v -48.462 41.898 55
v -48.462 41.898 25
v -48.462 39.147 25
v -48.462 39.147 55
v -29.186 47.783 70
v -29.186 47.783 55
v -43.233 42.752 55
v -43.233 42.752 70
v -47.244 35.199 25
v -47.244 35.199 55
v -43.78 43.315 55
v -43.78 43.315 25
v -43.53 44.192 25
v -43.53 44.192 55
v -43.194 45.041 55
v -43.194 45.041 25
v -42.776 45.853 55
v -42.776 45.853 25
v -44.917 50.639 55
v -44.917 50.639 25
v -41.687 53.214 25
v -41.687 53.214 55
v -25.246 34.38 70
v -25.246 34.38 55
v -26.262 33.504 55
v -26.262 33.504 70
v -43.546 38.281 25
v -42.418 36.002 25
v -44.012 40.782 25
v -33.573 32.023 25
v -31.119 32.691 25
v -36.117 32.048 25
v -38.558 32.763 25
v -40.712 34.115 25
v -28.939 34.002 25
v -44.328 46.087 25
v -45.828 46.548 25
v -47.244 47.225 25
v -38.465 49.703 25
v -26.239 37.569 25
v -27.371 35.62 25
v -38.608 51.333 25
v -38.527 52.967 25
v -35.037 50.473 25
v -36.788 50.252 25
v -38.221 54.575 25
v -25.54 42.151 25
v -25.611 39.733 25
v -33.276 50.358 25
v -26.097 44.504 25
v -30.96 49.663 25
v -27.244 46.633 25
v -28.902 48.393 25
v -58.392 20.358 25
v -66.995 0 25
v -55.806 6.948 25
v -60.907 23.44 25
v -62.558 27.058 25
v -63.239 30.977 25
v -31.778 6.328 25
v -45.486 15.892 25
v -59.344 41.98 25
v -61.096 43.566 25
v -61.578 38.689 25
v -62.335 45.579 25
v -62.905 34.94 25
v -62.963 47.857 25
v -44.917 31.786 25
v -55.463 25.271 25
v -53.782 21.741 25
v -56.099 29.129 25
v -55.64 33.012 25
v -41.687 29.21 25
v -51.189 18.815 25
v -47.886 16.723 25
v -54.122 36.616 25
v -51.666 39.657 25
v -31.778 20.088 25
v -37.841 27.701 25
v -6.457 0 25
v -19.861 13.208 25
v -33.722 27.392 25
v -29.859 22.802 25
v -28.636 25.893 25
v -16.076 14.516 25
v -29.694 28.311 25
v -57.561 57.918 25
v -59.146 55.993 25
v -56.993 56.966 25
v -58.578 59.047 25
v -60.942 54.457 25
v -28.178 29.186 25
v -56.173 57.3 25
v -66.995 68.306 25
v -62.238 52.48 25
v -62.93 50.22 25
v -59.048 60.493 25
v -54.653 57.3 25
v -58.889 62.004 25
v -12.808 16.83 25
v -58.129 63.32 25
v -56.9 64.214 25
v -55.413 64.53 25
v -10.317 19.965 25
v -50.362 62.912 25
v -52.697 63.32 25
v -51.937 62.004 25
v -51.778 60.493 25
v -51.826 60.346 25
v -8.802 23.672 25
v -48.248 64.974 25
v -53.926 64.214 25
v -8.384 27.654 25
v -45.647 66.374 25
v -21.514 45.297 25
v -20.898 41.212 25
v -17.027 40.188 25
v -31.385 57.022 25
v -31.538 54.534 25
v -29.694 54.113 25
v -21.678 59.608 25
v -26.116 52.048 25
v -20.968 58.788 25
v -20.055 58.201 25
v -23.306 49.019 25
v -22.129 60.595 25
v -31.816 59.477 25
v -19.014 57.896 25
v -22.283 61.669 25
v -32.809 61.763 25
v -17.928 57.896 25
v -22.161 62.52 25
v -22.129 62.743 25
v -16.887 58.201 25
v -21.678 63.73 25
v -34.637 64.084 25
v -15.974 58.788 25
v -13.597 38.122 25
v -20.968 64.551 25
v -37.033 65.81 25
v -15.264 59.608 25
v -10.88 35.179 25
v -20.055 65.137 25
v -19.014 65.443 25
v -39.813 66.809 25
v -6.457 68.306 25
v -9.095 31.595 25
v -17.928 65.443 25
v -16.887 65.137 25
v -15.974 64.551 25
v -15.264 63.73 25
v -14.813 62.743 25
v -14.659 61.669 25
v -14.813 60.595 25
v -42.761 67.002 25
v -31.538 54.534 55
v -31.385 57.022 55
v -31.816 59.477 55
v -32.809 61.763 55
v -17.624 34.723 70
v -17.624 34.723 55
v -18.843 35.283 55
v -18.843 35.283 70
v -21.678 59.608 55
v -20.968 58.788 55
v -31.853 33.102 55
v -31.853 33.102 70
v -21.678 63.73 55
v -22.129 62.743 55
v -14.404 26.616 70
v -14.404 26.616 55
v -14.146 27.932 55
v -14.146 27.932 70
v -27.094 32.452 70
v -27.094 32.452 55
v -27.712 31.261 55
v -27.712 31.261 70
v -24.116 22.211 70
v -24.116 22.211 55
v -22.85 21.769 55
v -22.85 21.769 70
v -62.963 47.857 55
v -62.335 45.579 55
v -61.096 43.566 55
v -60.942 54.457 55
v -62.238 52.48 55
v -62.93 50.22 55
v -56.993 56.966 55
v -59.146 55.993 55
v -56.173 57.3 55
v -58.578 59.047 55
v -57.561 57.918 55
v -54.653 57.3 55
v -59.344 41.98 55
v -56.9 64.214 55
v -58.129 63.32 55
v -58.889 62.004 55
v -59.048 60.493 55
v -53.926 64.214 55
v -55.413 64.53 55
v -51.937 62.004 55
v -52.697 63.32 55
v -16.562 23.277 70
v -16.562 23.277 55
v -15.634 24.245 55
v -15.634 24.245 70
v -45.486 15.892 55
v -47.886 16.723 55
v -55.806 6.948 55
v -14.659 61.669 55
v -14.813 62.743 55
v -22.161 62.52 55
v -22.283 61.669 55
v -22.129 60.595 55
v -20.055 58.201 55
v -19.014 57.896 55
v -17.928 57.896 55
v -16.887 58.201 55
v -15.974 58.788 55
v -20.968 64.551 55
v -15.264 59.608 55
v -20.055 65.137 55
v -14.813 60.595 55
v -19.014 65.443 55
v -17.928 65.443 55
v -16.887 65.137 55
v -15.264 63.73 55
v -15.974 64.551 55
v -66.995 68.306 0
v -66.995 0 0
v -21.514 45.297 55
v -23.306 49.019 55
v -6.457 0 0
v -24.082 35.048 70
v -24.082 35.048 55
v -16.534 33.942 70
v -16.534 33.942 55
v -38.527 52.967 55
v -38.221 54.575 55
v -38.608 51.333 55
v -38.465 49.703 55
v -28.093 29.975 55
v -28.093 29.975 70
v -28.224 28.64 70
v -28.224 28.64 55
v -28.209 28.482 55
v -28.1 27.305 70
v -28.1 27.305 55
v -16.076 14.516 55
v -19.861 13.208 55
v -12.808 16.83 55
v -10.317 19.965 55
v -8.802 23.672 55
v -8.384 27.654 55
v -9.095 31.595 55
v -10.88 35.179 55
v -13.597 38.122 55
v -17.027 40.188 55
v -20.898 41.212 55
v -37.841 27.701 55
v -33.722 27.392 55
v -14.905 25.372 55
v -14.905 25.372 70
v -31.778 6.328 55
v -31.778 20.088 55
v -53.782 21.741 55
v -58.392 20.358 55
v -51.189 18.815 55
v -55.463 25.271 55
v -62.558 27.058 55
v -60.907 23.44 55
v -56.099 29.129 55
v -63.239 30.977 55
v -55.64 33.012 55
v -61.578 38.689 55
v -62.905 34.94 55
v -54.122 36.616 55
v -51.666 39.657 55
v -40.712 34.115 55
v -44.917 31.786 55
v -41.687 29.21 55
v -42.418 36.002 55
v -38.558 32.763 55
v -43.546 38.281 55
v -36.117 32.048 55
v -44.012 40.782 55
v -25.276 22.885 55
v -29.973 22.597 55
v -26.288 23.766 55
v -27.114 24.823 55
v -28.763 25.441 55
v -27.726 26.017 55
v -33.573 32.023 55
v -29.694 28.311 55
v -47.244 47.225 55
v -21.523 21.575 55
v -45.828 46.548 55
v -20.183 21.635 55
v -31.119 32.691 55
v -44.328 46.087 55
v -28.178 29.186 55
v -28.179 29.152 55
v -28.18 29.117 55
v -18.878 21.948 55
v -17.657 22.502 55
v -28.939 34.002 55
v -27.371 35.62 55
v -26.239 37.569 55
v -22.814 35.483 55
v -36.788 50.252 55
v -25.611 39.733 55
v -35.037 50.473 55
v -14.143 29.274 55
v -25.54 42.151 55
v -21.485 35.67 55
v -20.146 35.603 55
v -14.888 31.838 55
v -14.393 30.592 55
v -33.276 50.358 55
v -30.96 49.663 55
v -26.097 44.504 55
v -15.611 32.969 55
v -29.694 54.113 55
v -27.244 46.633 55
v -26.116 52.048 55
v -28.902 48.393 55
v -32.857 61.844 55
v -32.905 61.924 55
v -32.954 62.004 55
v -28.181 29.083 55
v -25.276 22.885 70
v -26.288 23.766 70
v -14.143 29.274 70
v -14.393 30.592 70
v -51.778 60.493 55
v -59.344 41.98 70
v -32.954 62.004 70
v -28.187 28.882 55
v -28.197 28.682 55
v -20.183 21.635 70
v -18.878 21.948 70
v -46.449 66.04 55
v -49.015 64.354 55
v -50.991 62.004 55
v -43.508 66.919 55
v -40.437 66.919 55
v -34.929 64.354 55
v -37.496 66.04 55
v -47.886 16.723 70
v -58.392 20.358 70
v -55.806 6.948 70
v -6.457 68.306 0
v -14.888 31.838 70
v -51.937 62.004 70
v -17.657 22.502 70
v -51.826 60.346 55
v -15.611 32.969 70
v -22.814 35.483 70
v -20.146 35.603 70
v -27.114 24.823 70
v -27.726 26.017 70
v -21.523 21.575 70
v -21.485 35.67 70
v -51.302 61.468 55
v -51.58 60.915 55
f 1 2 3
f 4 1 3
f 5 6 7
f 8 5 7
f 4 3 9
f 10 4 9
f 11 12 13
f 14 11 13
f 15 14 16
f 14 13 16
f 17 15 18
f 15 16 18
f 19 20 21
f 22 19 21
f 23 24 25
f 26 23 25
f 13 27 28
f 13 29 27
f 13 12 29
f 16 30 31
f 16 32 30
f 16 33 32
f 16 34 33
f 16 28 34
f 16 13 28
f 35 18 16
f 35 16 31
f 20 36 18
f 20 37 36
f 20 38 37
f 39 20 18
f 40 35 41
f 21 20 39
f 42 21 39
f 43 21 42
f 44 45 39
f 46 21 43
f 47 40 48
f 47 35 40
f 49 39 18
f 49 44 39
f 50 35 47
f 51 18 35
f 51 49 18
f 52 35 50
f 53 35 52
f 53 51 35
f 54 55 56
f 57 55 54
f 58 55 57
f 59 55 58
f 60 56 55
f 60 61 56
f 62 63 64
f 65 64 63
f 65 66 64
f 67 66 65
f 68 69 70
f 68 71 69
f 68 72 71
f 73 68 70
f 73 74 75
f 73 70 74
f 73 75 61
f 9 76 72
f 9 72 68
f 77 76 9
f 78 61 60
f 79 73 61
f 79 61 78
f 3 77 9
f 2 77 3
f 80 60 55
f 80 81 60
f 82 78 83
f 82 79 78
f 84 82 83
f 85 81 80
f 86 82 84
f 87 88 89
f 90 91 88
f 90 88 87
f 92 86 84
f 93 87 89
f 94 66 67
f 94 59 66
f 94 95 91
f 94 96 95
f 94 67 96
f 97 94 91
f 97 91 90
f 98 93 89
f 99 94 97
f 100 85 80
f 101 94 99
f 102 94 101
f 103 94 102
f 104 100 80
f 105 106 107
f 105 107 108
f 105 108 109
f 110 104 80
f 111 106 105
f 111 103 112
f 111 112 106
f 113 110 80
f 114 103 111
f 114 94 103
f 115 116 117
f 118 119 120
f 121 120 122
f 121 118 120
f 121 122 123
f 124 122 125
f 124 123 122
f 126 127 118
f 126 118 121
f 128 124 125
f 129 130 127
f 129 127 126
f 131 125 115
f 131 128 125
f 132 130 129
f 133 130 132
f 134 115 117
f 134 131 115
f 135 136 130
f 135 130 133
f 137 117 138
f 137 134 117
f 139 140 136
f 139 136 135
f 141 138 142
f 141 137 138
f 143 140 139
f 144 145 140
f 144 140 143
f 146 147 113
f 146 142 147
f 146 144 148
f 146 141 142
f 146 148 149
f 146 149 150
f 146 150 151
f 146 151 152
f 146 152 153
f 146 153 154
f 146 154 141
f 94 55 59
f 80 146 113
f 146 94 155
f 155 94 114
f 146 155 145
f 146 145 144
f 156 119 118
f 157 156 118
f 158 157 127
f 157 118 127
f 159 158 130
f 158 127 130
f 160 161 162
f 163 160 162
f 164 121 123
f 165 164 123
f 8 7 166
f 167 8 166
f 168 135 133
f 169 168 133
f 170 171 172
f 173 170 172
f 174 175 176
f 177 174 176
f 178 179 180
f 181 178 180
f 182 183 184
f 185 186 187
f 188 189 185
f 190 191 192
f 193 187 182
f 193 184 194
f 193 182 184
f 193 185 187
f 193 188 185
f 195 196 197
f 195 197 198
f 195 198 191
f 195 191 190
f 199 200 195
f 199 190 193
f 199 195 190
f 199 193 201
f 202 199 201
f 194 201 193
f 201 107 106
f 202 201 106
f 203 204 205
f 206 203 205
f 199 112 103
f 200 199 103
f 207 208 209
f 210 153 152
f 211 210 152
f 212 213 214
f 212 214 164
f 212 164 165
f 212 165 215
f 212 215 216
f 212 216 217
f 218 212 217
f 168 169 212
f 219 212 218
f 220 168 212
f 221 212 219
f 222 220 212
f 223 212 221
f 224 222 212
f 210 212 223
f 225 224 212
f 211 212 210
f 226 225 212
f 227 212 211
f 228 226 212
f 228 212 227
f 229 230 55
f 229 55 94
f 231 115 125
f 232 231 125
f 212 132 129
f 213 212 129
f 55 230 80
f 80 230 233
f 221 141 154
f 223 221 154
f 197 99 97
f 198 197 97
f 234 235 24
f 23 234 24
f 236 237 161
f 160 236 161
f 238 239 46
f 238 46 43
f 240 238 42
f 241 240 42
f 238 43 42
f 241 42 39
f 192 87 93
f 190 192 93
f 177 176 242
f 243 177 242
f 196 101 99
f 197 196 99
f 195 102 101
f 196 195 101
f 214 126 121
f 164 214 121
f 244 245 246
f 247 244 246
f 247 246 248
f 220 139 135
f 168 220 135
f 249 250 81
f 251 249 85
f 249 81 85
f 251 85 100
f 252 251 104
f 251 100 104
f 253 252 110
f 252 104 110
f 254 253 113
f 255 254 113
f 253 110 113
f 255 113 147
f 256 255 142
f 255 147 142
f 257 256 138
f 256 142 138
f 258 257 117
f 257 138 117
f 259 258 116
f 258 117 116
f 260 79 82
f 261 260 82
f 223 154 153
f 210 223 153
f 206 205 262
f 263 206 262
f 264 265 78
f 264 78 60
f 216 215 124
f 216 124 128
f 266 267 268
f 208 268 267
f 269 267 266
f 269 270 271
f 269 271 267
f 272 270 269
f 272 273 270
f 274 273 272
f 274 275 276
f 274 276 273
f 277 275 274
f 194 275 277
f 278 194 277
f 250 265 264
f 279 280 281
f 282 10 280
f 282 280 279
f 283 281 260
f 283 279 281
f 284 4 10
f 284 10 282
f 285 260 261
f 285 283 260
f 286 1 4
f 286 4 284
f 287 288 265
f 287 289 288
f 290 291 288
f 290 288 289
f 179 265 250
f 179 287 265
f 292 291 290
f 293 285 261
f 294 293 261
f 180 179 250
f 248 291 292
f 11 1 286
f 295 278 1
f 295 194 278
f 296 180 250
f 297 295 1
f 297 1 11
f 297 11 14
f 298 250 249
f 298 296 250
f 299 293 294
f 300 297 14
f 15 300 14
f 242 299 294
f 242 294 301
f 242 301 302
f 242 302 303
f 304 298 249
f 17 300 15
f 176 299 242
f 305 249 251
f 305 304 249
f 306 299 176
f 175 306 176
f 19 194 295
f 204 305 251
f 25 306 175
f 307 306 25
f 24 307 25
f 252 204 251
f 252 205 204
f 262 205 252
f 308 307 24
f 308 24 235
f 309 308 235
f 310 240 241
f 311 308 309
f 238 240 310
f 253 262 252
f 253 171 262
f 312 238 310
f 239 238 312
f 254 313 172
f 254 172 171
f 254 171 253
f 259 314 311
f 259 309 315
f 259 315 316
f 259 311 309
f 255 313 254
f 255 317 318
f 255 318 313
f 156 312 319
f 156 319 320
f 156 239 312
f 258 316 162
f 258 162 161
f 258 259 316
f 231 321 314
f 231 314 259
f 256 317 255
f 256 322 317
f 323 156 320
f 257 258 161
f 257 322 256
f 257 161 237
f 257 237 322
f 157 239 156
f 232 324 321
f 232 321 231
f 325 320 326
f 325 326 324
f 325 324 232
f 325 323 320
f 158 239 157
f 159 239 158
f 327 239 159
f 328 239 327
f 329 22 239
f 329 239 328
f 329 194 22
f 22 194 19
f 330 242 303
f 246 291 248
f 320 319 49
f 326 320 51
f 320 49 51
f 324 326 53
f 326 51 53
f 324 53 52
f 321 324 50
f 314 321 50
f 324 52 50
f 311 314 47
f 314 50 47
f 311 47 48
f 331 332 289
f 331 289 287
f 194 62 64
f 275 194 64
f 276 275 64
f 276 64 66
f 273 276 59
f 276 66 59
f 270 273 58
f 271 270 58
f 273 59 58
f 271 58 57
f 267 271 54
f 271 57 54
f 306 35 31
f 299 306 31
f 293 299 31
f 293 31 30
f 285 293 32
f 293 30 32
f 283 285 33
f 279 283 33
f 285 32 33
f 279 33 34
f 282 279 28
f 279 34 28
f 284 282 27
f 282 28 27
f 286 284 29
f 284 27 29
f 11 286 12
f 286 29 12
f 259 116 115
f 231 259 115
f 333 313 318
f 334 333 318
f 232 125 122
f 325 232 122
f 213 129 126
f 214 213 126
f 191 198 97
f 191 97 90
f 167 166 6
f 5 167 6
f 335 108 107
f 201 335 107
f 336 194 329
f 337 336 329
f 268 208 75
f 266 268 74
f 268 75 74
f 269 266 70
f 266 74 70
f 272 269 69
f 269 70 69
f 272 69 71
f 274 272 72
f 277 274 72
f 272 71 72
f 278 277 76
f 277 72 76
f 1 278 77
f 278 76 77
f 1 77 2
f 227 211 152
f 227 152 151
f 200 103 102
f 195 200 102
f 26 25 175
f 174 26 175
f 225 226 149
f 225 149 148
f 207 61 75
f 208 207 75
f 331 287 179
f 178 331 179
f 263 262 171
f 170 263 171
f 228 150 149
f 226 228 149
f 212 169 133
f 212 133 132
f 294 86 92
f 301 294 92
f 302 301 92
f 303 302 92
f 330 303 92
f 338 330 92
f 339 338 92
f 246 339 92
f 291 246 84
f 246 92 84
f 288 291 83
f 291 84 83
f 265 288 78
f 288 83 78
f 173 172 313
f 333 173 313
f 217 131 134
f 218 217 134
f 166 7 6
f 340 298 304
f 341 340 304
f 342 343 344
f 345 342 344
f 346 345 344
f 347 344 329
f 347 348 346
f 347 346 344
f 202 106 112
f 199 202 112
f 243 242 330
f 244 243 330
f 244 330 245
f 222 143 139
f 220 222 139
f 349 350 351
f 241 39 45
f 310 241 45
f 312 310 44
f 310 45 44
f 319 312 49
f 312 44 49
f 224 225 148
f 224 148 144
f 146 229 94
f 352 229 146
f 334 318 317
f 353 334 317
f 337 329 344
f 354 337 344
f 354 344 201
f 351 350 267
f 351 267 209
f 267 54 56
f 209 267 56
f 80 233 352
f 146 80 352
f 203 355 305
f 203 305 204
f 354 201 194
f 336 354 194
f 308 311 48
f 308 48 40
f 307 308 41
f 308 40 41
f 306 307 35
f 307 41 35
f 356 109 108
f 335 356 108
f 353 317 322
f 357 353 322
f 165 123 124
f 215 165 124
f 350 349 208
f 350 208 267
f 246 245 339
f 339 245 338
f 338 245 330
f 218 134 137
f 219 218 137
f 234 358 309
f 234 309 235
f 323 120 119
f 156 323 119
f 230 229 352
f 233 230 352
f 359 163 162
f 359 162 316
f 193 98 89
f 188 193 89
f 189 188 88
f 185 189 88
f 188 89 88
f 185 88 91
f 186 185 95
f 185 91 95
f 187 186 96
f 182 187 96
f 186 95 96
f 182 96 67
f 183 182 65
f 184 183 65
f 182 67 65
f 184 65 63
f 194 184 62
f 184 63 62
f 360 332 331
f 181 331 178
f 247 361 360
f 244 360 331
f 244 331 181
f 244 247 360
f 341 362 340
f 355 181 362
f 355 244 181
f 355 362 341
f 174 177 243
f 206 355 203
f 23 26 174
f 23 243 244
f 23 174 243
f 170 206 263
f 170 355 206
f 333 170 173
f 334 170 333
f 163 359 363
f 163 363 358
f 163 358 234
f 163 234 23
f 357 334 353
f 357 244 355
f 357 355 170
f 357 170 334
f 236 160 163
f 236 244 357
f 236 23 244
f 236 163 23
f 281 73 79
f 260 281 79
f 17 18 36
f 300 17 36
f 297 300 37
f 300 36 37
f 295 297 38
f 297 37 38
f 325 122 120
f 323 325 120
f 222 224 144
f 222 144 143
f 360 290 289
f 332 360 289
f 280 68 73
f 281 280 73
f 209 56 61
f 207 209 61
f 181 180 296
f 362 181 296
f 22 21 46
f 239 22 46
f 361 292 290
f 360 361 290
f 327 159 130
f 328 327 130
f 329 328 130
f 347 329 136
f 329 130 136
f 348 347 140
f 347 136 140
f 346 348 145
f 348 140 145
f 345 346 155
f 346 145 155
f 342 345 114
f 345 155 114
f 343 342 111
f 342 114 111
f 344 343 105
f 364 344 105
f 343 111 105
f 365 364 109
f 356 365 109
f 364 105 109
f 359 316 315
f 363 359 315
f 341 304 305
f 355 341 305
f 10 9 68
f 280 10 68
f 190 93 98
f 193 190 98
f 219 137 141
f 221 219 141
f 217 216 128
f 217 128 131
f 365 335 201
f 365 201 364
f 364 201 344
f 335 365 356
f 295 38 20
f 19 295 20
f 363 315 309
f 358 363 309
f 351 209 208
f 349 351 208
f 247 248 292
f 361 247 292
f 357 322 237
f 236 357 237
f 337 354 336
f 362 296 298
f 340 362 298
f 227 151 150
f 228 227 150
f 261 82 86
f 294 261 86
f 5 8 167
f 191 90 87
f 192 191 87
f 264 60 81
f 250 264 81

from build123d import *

# Parameters (mm, degrees)
F0_W     = 60.5372022837
F0_H     = 68.3061406016
F1_DEPTH = 25
F3_DEPTH = 30
F5_DEPTH = 15


with BuildPart() as f1:
    # F0 (on Top) → F1 (new body)
    with BuildSketch(Plane.XY):
        with Locations((-36.7259019986, 34.1530703008)):
            Rectangle(F0_W, F0_H)
    extrude(amount=F1_DEPTH)

    # F2 (on face) → F3 (join)
    with BuildSketch(Plane.XY.offset(25)):
        with BuildLine():
            Line((-22.1290194054, 62.743389809), (-22.1611187409, 62.5201340268))
            ThreePointArc((-22.1611187409, 62.5201340268), (-19.2077082943, 60.7472143348), (-16.8872465406, 58.2013677664))
            Line((-16.8872465406, 58.2013677664), (-15.9743708465, 58.788037352))
            Line((-15.9743708465, 58.788037352), (-15.2637569545, 59.6081295006))
            Line((-15.2637569545, 59.6081295006), (-14.8129745762, 60.5952052236))
            Line((-14.8129745762, 60.5952052236), (-14.6585434187, 61.6692975163))
            Line((-14.6585434187, 61.6692975163), (-14.8129745762, 62.743389809))
            Line((-14.8129745762, 62.743389809), (-15.2637569545, 63.7304655321))
            Line((-15.2637569545, 63.7304655321), (-15.9743708465, 64.5505576807))
            Line((-15.9743708465, 64.5505576807), (-16.8872465406, 65.1372272663))
            Line((-16.8872465406, 65.1372272663), (-17.9284282773, 65.4429458082))
            Line((-17.9284282773, 65.4429458082), (-19.0135657043, 65.4429458082))
            Line((-19.0135657043, 65.4429458082), (-20.054747441, 65.1372272663))
            Line((-20.054747441, 65.1372272663), (-20.9676231351, 64.5505576807))
            Line((-20.9676231351, 64.5505576807), (-21.6782370271, 63.7304655321))
            Line((-21.6782370271, 63.7304655321), (-22.1290194054, 62.743389809))
        make_face()
        with BuildLine():
            ThreePointArc((-16.8872465406, 58.2013677664), (-19.2077082943, 60.7472143348), (-22.1611187409, 62.5201340268))
            Line((-22.1611187409, 62.5201340268), (-22.2834505629, 61.6692975163))
            Line((-22.2834505629, 61.6692975163), (-22.1290194054, 60.5952052236))
            Line((-22.1290194054, 60.5952052236), (-21.6782370271, 59.6081295006))
            Line((-21.6782370271, 59.6081295006), (-20.9676231351, 58.788037352))
            Line((-20.9676231351, 58.788037352), (-20.054747441, 58.2013677664))
            Line((-20.054747441, 58.2013677664), (-19.0135657043, 57.8956492245))
            Line((-19.0135657043, 57.8956492245), (-17.9284282773, 57.8956492245))
            Line((-17.9284282773, 57.8956492245), (-16.8872465406, 58.2013677664))
        make_face()
        with BuildLine():
            Line((-48.4615378082, 41.8981585313), (-48.4615378082, 39.1465827014))
            Line((-48.4615378082, 39.1465827014), (-47.2438519434, 35.1989420851))
            Line((-47.2438519434, 35.1989420851), (-44.9166769466, 31.7856032745))
            Line((-44.9166769466, 31.7856032745), (-41.686792529, 29.2098564023))
            Line((-41.686792529, 29.2098564023), (-37.8411880951, 27.7005678815))
            Line((-37.8411880951, 27.7005678815), (-33.7215624751, 27.3918446205))
            Line((-33.7215624751, 27.3918446205), (-29.6939624839, 28.3111180359))
            Line((-29.6939624839, 28.3111180359), (-28.1783982184, 29.1861294726))
            ThreePointArc((-28.1783982184, 29.1861294726), (-28.3470166225, 31.6274853373), (-28.9392695125, 34.0019088756))
            ThreePointArc((-28.9392695125, 34.0019088756), (-39.6817311484, 33.3644756914), (-43.7803290259, 43.3147670692))
            ThreePointArc((-43.7803290259, 43.3147670692), (-46.1834406724, 42.8130191671), (-48.4615378082, 41.8981585313))
        make_face()
        with BuildLine():
            ThreePointArc((-47.8855758698, 16.7225310416), (-56.0985992666, 29.1290375757), (-48.4615378082, 41.8981585313))
            Line((-48.4615378082, 41.8981585313), (-48.4615378082, 43.2777599309))
            ThreePointArc((-48.4615378082, 43.2777599309), (-53.6612100365, 40.6027497312), (-59.3440614757, 41.9802367072))
            ThreePointArc((-59.3440614757, 41.9802367072), (-63.2393202989, 30.9765947301), (-58.3921782672, 20.3578192741))
            Line((-58.3921782672, 20.3578192741), (-47.8855758698, 16.7225310416))
        make_face()
        with BuildLine():
            Line((-48.4615378082, 43.2777599309), (-48.4615378082, 41.8981585313))
            ThreePointArc((-48.4615378082, 41.8981585313), (-46.1834406724, 42.8130191671), (-43.7803290259, 43.3147670692))
            ThreePointArc((-43.7803290259, 43.3147670692), (-43.3721622104, 44.6210053314), (-42.7760281809, 45.8528668356))
            ThreePointArc((-42.7760281809, 45.8528668356), (-45.0865004205, 46.289917089), (-47.2438519434, 47.2254005472))
            Line((-47.2438519434, 47.2254005472), (-48.4615378082, 43.2777599309))
        make_face()
        with BuildLine():
            ThreePointArc((-59.3440614757, 41.9802367072), (-53.6612100365, 40.6027497312), (-48.4615378082, 43.2777599309))
            Line((-48.4615378082, 43.2777599309), (-47.2438519434, 47.2254005472))
            ThreePointArc((-47.2438519434, 47.2254005472), (-53.876714481, 45.9471982035), (-59.3440614757, 41.9802367072))
        make_face()
        with BuildLine():
            ThreePointArc((-45.486169294, 15.8923354978), (-46.7047814193, 16.2527835078), (-47.8855758698, 16.7225310416))
            Line((-47.8855758698, 16.7225310416), (-58.3921782672, 20.3578192741))
            Line((-58.3921782672, 20.3578192741), (-55.806396171, 6.9481457536))
            Line((-55.806396171, 6.9481457536), (-45.486169294, 15.8923354978))
        make_face()
        with BuildLine():
            Line((-45.486169294, 15.8923354978), (-47.8855758698, 16.7225310416))
            ThreePointArc((-47.8855758698, 16.7225310416), (-46.7047814193, 16.2527835078), (-45.486169294, 15.8923354978))
        make_face()
        with BuildLine():
            ThreePointArc((-59.3440614757, 41.9802367072), (-53.876714481, 45.9471982035), (-47.2438519434, 47.2254005472))
            Line((-47.2438519434, 47.2254005472), (-44.9166769466, 50.6387393578))
            Line((-44.9166769466, 50.6387393578), (-41.686792529, 53.21448623))
            Line((-41.686792529, 53.21448623), (-38.2209121076, 54.574744058))
            ThreePointArc((-38.2209121076, 54.574744058), (-36.2220725565, 58.7014227602), (-32.8090456732, 61.7634619755))
            ThreePointArc((-32.8090456732, 61.7634619755), (-42.7606691135, 67.0015367598), (-51.825799188, 60.3460387865))
            Line((-51.825799188, 60.3460387865), (-52.247753704, 59.047396319))
            Line((-52.247753704, 59.047396319), (-53.264693363, 57.9179704069))
            Line((-53.264693363, 57.9179704069), (-54.6530928733, 57.2998151183))
            ThreePointArc((-54.6530928733, 57.2998151183), (-62.6639397249, 51.3748019707), (-59.3440614757, 41.9802367072))
        make_face()
        with BuildLine():
            ThreePointArc((-25.6112270877, 39.7333110178), (-26.7452222219, 36.5598407079), (-28.9392695125, 34.0019088756))
            ThreePointArc((-28.9392695125, 34.0019088756), (-28.3470166225, 31.6274853373), (-28.1783982184, 29.1861294726))
            Line((-28.1783982184, 29.1861294726), (-26.1162580557, 30.3767066506))
            Line((-26.1162580557, 30.3767066506), (-23.3063439293, 33.4050738515))
            Line((-23.3063439293, 33.4050738515), (-21.513893306, 37.1271359231))
            Line((-21.513893306, 37.1271359231), (-20.8981732898, 41.2121713161))
            ThreePointArc((-20.8981732898, 41.2121713161), (-23.176972105, 40.225025652), (-25.6112270877, 39.7333110178))
        make_face()
        with BuildLine():
            Line((-56.1728853462, 57.2998151183), (-54.6530928733, 57.2998151183))
            Line((-54.6530928733, 57.2998151183), (-53.264693363, 57.9179704069))
            Line((-53.264693363, 57.9179704069), (-52.247753704, 59.047396319))
            ThreePointArc((-52.247753704, 59.047396319), (-52.0577008848, 59.703516315), (-51.825799188, 60.3460387865))
            Line((-51.825799188, 60.3460387865), (-51.778112002, 60.4928048539))
            Line((-51.778112002, 60.4928048539), (-51.9369735736, 62.0042717447))
            Line((-51.9369735736, 62.0042717447), (-52.6968698101, 63.3204506348))
            Line((-52.6968698101, 63.3204506348), (-53.9264077487, 64.2137622369))
            Line((-53.9264077487, 64.2137622369), (-55.4129891098, 64.5297448597))
            Line((-55.4129891098, 64.5297448597), (-56.8995704708, 64.2137622369))
            Line((-56.8995704708, 64.2137622369), (-58.1291084094, 63.3204506348))
            Line((-58.1291084094, 63.3204506348), (-58.8890046459, 62.0042717447))
            Line((-58.8890046459, 62.0042717447), (-59.0478662176, 60.4928048539))
            Line((-59.0478662176, 60.4928048539), (-58.5782245155, 59.047396319))
            Line((-58.5782245155, 59.047396319), (-57.5612848565, 57.9179704069))
            Line((-57.5612848565, 57.9179704069), (-56.1728853462, 57.2998151183))
        make_face()
        with BuildLine():
            ThreePointArc((-38.2209121076, 54.574744058), (-38.5956254636, 52.1514414918), (-38.4647376729, 49.7028349876))
            ThreePointArc((-38.4647376729, 49.7028349876), (-35.917775225, 50.4040156063), (-33.276460423, 50.3578843983))
            ThreePointArc((-33.276460423, 50.3578843983), (-32.1821663883, 52.3522954386), (-31.538439496, 54.5342144381))
            Line((-31.538439496, 54.5342144381), (-33.7215624751, 55.0324980118))
            Line((-33.7215624751, 55.0324980118), (-37.8411880951, 54.7237747508))
            Line((-37.8411880951, 54.7237747508), (-38.2209121076, 54.574744058))
        make_face()
        with BuildLine():
            ThreePointArc((-25.4924368754, 41.2121713161), (-25.5221821781, 40.4703595313), (-25.6112270877, 39.7333110178))
            ThreePointArc((-25.6112270877, 39.7333110178), (-23.176972105, 40.225025652), (-20.8981732898, 41.2121713161))
            Line((-20.8981732898, 41.2121713161), (-21.513893306, 45.2972067092))
            Line((-21.513893306, 45.2972067092), (-23.3063439293, 49.0192687807))
            Line((-23.3063439293, 49.0192687807), (-26.1162580557, 52.0476359817))
            Line((-26.1162580557, 52.0476359817), (-29.6939624839, 54.1132245964))
            Line((-29.6939624839, 54.1132245964), (-31.538439496, 54.5342144381))
            ThreePointArc((-31.538439496, 54.5342144381), (-32.1821663883, 52.3522954386), (-33.276460423, 50.3578843983))
            ThreePointArc((-33.276460423, 50.3578843983), (-27.7018972848, 47.2170670349), (-25.4924368754, 41.2121713161))
        make_face()
        with BuildLine():
            Line((-26.1162580557, 30.3767066506), (-28.1783982184, 29.1861294726))
            ThreePointArc((-28.1783982184, 29.1861294726), (-29.1552178734, 24.3113994943), (-31.7780598998, 20.087909385))
            Line((-31.7780598998, 20.087909385), (-19.8612846434, 13.2077559829))
            ThreePointArc((-19.8612846434, 13.2077559829), (-8.3836595485, 27.654128901), (-20.8981732898, 41.2121713161))
            Line((-20.8981732898, 41.2121713161), (-21.513893306, 37.1271359231))
            Line((-21.513893306, 37.1271359231), (-23.3063439293, 33.4050738515))
            Line((-23.3063439293, 33.4050738515), (-26.1162580557, 30.3767066506))
        make_face()
        with BuildLine():
            ThreePointArc((-32.8090456732, 61.7634619755), (-36.2220725565, 58.7014227602), (-38.2209121076, 54.574744058))
            Line((-38.2209121076, 54.574744058), (-37.8411880951, 54.7237747508))
            Line((-37.8411880951, 54.7237747508), (-33.7215624751, 55.0324980118))
            Line((-33.7215624751, 55.0324980118), (-31.538439496, 54.5342144381))
            ThreePointArc((-31.538439496, 54.5342144381), (-31.5283054399, 58.2622796706), (-32.8090456732, 61.7634619755))
        make_face()
        Polygon((-19.8612846434, 13.2077559829), (-31.7780598998, 20.087909385), (-31.7780598998, 6.3276025807), align=None)
        with BuildLine():
            ThreePointArc((-51.825799188, 60.3460387865), (-52.0577008848, 59.703516315), (-52.247753704, 59.047396319))
            Line((-52.247753704, 59.047396319), (-51.825799188, 60.3460387865))
        make_face()
    extrude(amount=F3_DEPTH)

    # F4 (on face) → F5, piece 2 (join)
    with BuildSketch(Plane.XY.offset(55)):
        Polygon((-26.2620052687, 33.5041556085), (-27.0939852202, 32.4519443914), (-27.711797928, 31.2612947606), (-28.093114031, 29.9752398961), (-28.2241517719, 28.6402611713), (-28.1001751053, 27.3046081957), (-27.7256648709, 26.0165549478), (-27.1141568443, 24.822655028), (-26.2877525189, 23.76605909), (-25.2763203003, 22.8849552641), (-24.116415984, 22.211188938), (-22.8499615341, 21.7691117825), (-21.5227299142, 21.5747016176), (-20.1826907331, 21.6349849332), (-18.8782764982, 21.9477829334), (-17.6566321386, 22.5017902833), (-16.5619110644, 23.2769837138), (-15.6336793475, 24.2453457148), (-14.9054857006, 25.3718771603), (-14.4036489395, 26.6158622689), (-14.1463067521, 27.9323401774), (-14.1427601557, 29.2737299443), (-14.3931373335, 30.5915502484), (-14.8883890019, 31.8381716304), (-15.6106154753, 32.9685379455), (-16.5337136071, 33.9417948099), (-17.6243202258, 34.7227661848), (-18.8430179666, 35.2832257298), (-20.1457599179, 35.6029169768), (-21.4854615914, 35.6702854511), (-22.8137026779, 35.4828962805), (-24.0824770839, 35.0475221979), (-25.2459279966, 34.379898757), align=None)
        Polygon((-59.3440614757, 41.9802367072), (-32.9535993169, 62.0042717447), (-51.9369735736, 62.0042717447), align=None)
        Polygon((-47.8855758698, 16.7225310416), (-58.3921782672, 20.3578192741), (-55.806396171, 6.9481457536), align=None)
    extrude(amount=F5_DEPTH)


with BuildPart() as f5:
    # F4 (on face) → F5 (new body)
    with BuildSketch(Plane.XY.offset(55)):
        Polygon((-43.2330894863, 42.7516107818), (-31.8525281156, 33.1021616796), (-29.1861407459, 47.782741487), align=None)
    extrude(amount=F5_DEPTH)


solid = Compound([f1.part, f5.part])
